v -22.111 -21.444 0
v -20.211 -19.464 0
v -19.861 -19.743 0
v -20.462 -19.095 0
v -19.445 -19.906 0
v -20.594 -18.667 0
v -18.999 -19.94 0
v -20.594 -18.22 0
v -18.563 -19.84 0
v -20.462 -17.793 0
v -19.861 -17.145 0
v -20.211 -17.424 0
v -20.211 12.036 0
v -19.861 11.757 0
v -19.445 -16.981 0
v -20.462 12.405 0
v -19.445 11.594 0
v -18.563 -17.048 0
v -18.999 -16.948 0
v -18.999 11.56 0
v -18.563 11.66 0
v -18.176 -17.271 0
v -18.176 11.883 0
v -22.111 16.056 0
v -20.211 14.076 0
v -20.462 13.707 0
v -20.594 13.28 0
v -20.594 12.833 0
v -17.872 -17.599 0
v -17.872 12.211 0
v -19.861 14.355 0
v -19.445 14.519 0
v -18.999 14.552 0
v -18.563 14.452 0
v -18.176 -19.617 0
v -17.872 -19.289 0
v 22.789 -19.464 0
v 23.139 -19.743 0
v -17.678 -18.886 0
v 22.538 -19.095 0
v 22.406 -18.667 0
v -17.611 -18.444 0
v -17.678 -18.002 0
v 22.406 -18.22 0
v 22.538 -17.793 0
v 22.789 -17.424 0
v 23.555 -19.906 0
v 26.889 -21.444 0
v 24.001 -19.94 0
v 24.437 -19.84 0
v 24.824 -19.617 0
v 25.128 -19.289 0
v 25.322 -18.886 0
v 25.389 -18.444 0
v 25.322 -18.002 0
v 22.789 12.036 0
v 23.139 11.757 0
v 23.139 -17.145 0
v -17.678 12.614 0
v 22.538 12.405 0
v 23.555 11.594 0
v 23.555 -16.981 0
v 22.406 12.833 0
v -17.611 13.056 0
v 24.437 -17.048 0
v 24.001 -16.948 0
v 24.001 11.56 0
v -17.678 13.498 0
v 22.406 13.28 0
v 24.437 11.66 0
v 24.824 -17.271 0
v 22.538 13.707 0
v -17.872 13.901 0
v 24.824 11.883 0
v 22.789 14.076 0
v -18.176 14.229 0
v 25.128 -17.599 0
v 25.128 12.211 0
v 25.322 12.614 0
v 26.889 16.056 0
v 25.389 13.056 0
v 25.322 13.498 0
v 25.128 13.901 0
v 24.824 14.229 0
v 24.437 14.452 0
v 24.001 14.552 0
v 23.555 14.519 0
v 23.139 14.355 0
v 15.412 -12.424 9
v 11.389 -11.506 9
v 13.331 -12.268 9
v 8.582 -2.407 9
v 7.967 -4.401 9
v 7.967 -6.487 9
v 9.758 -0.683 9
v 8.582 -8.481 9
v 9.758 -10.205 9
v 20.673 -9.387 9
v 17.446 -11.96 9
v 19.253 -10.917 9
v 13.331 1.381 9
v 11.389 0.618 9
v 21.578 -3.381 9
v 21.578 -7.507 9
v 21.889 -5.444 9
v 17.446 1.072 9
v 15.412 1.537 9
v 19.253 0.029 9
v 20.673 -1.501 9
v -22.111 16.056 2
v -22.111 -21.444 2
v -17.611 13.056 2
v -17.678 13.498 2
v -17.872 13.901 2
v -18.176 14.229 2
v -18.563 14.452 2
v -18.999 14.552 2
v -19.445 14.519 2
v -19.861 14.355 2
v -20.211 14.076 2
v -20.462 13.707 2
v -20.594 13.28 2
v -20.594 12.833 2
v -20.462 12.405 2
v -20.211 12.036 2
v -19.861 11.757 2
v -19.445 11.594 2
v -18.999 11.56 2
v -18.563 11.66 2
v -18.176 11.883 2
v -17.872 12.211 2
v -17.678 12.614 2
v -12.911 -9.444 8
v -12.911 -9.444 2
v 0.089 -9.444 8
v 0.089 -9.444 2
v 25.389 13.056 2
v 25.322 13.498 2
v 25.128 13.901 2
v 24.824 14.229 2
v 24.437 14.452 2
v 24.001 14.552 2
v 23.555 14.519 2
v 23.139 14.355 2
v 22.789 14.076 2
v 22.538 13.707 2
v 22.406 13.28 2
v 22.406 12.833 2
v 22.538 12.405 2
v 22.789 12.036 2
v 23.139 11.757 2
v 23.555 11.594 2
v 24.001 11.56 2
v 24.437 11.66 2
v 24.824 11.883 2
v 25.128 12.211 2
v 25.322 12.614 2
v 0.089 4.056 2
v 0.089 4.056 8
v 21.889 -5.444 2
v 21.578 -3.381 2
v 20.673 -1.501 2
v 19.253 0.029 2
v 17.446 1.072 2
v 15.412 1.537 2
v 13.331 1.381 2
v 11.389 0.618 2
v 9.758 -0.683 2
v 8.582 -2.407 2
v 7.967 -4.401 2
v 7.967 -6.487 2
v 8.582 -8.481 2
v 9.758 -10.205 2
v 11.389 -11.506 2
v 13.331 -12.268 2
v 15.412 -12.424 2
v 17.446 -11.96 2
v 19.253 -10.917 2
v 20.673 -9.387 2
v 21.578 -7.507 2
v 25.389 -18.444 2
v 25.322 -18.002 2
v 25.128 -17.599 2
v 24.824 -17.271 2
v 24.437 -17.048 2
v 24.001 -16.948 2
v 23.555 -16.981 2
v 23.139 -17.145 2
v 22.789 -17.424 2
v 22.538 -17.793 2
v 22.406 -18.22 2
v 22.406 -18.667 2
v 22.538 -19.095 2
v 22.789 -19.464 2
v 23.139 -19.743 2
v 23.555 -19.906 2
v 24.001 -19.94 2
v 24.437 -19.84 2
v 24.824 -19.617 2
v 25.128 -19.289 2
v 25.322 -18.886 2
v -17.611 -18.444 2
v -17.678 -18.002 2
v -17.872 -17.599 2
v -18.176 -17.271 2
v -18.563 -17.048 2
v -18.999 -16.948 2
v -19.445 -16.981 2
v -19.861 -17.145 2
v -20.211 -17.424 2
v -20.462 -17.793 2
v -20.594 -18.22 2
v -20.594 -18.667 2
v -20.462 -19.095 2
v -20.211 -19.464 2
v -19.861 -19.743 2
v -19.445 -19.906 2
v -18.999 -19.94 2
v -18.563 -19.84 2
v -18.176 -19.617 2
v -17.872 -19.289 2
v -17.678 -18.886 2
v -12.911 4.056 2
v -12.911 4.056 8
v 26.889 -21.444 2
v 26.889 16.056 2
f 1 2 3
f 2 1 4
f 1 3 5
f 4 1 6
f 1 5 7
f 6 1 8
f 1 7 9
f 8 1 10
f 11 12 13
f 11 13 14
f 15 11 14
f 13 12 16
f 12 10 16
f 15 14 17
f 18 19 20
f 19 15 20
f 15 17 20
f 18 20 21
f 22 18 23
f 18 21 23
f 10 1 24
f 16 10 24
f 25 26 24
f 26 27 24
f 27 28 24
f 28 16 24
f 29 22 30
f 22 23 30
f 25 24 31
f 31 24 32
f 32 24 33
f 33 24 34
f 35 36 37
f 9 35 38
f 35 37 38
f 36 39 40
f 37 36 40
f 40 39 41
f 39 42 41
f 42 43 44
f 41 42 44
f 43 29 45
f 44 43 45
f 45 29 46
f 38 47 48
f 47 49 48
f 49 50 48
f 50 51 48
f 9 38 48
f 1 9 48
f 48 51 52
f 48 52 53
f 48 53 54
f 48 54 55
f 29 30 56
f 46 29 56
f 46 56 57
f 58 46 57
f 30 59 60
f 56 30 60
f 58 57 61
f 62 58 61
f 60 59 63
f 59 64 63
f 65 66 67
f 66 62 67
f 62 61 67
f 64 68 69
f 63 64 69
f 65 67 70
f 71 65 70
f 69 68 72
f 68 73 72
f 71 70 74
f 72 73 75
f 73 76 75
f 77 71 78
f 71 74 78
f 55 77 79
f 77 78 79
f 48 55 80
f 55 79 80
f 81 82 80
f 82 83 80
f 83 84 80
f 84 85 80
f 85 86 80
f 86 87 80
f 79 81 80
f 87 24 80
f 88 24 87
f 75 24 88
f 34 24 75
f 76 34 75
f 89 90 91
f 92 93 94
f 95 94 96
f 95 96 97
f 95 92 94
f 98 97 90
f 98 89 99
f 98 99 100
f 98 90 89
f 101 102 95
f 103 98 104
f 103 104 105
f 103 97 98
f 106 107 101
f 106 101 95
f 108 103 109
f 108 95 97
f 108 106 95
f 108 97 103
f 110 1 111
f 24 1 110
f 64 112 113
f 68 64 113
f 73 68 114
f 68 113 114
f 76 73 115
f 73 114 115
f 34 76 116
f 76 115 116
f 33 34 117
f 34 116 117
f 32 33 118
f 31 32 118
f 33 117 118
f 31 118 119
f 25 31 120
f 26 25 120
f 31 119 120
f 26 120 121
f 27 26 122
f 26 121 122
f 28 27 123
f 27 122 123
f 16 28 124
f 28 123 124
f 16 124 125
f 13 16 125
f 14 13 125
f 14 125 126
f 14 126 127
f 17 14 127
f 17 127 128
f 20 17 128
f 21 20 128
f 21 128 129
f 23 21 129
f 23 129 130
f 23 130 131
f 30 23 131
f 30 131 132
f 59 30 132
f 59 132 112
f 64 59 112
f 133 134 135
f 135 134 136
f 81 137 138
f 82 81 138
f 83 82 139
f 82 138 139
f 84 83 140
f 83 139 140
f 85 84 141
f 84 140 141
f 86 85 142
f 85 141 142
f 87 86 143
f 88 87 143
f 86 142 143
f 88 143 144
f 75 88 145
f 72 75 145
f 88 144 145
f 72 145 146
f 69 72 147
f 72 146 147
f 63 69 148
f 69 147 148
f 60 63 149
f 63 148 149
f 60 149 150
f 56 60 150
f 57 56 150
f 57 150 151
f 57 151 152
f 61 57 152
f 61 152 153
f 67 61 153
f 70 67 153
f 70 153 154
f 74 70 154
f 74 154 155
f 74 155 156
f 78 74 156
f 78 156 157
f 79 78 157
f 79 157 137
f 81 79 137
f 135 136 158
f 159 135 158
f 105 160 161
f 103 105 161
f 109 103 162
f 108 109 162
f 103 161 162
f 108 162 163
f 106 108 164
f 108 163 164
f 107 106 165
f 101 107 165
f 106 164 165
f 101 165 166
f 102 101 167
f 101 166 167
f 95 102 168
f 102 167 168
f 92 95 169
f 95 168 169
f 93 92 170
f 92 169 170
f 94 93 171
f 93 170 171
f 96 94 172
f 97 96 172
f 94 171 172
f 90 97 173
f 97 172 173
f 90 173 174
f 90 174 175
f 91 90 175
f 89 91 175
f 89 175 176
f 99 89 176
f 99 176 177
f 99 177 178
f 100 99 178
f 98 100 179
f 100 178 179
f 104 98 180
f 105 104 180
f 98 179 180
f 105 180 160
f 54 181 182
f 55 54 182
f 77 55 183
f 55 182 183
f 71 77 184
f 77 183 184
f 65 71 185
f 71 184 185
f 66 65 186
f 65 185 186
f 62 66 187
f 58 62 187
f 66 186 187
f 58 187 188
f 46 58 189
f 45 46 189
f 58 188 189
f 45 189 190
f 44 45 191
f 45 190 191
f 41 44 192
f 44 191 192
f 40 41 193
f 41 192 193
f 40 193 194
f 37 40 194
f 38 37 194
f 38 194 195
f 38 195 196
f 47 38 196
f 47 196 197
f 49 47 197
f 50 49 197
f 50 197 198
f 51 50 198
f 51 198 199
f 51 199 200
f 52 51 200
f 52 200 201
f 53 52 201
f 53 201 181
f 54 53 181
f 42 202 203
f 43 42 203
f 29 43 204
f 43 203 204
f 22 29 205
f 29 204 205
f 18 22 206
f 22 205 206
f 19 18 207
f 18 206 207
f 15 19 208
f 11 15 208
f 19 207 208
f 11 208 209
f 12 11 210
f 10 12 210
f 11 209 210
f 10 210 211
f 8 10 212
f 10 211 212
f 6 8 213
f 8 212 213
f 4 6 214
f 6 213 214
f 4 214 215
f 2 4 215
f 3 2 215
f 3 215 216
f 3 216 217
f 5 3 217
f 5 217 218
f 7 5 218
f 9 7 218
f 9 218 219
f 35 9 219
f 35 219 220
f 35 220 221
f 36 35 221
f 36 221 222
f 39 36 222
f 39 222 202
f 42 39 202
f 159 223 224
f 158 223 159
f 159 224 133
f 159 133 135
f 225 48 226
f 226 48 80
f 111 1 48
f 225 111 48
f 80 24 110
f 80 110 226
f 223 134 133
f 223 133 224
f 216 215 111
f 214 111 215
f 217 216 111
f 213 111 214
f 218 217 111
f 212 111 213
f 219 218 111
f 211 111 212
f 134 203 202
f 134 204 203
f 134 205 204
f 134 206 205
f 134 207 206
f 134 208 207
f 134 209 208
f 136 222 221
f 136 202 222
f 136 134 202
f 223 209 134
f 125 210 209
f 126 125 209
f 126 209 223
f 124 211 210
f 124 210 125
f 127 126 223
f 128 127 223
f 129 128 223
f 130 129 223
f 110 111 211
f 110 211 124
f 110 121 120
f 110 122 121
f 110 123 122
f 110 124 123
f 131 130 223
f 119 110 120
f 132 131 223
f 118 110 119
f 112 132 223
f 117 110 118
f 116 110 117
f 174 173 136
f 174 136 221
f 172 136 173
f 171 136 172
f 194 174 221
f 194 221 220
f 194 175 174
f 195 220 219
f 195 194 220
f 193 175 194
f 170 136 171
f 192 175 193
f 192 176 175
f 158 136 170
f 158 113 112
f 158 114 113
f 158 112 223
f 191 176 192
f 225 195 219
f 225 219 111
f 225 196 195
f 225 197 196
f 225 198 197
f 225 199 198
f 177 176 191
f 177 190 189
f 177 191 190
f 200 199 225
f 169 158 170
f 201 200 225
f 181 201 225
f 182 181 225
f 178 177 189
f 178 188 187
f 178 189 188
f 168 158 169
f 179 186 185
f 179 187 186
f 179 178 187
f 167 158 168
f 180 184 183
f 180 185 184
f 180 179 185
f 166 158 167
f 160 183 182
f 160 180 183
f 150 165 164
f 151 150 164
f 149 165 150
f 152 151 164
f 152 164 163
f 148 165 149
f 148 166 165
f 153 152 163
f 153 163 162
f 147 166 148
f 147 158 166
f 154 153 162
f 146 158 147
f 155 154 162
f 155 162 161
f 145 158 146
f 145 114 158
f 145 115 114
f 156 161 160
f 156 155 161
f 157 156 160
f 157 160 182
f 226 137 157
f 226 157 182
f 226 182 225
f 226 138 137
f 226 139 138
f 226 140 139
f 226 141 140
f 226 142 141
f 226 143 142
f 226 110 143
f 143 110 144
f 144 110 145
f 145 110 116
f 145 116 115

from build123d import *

# Parameters (mm, degrees)
SKETCH_1_W          = 49
SKETCH_1_H          = 37.5
EXTRUDE_1_DEPTH     = 2
SKETCH_2_R          = 1.5
CUT_EXTRUDE_1_DEPTH = 35.450757188
SKETCH_3_R          = 7
EXTRUDE_2_DEPTH     = 7
SKETCH_4_W          = 13
SKETCH_4_H          = 13.5
EXTRUDE_3_DEPTH     = 6


with BuildPart() as part:
    # Эскиз1 → Бобышка-Вытянуть1 (new body)
    with BuildSketch(Plane.XY):
        with Locations((2.388954836, -2.693851768)):
            Rectangle(SKETCH_1_W, SKETCH_1_H)
    extrude(amount=EXTRUDE_1_DEPTH)

    # Эскиз2 → Вырез-Вытянуть1 (cut, through all)
    with BuildSketch(Plane.XY.offset(2)):
        with Locations((-19.111045164, 13.056148232)):
            Circle(SKETCH_2_R)
        with Locations((23.888954836, 13.056148232)):
            Circle(SKETCH_2_R)
        with Locations((23.888954836, -18.443851768)):
            Circle(SKETCH_2_R)
        with Locations((-19.111045164, -18.443851768)):
            Circle(SKETCH_2_R)
    extrude(amount=-CUT_EXTRUDE_1_DEPTH, mode=Mode.SUBTRACT)

    # Эскиз3 → Бобышка-Вытянуть2 (add)
    with BuildSketch(Plane.XY.offset(2)):
        with Locations((14.888954836, -5.443851768)):
            Circle(SKETCH_3_R)
    extrude(amount=EXTRUDE_2_DEPTH)

    # Эскиз4 → Бобышка-Вытянуть3 (add)
    with BuildSketch(Plane.XY.offset(2)):
        with Locations((-6.411045164, -2.693851768)):
            Rectangle(SKETCH_4_W, SKETCH_4_H)
    extrude(amount=EXTRUDE_3_DEPTH)


solid = part.part
